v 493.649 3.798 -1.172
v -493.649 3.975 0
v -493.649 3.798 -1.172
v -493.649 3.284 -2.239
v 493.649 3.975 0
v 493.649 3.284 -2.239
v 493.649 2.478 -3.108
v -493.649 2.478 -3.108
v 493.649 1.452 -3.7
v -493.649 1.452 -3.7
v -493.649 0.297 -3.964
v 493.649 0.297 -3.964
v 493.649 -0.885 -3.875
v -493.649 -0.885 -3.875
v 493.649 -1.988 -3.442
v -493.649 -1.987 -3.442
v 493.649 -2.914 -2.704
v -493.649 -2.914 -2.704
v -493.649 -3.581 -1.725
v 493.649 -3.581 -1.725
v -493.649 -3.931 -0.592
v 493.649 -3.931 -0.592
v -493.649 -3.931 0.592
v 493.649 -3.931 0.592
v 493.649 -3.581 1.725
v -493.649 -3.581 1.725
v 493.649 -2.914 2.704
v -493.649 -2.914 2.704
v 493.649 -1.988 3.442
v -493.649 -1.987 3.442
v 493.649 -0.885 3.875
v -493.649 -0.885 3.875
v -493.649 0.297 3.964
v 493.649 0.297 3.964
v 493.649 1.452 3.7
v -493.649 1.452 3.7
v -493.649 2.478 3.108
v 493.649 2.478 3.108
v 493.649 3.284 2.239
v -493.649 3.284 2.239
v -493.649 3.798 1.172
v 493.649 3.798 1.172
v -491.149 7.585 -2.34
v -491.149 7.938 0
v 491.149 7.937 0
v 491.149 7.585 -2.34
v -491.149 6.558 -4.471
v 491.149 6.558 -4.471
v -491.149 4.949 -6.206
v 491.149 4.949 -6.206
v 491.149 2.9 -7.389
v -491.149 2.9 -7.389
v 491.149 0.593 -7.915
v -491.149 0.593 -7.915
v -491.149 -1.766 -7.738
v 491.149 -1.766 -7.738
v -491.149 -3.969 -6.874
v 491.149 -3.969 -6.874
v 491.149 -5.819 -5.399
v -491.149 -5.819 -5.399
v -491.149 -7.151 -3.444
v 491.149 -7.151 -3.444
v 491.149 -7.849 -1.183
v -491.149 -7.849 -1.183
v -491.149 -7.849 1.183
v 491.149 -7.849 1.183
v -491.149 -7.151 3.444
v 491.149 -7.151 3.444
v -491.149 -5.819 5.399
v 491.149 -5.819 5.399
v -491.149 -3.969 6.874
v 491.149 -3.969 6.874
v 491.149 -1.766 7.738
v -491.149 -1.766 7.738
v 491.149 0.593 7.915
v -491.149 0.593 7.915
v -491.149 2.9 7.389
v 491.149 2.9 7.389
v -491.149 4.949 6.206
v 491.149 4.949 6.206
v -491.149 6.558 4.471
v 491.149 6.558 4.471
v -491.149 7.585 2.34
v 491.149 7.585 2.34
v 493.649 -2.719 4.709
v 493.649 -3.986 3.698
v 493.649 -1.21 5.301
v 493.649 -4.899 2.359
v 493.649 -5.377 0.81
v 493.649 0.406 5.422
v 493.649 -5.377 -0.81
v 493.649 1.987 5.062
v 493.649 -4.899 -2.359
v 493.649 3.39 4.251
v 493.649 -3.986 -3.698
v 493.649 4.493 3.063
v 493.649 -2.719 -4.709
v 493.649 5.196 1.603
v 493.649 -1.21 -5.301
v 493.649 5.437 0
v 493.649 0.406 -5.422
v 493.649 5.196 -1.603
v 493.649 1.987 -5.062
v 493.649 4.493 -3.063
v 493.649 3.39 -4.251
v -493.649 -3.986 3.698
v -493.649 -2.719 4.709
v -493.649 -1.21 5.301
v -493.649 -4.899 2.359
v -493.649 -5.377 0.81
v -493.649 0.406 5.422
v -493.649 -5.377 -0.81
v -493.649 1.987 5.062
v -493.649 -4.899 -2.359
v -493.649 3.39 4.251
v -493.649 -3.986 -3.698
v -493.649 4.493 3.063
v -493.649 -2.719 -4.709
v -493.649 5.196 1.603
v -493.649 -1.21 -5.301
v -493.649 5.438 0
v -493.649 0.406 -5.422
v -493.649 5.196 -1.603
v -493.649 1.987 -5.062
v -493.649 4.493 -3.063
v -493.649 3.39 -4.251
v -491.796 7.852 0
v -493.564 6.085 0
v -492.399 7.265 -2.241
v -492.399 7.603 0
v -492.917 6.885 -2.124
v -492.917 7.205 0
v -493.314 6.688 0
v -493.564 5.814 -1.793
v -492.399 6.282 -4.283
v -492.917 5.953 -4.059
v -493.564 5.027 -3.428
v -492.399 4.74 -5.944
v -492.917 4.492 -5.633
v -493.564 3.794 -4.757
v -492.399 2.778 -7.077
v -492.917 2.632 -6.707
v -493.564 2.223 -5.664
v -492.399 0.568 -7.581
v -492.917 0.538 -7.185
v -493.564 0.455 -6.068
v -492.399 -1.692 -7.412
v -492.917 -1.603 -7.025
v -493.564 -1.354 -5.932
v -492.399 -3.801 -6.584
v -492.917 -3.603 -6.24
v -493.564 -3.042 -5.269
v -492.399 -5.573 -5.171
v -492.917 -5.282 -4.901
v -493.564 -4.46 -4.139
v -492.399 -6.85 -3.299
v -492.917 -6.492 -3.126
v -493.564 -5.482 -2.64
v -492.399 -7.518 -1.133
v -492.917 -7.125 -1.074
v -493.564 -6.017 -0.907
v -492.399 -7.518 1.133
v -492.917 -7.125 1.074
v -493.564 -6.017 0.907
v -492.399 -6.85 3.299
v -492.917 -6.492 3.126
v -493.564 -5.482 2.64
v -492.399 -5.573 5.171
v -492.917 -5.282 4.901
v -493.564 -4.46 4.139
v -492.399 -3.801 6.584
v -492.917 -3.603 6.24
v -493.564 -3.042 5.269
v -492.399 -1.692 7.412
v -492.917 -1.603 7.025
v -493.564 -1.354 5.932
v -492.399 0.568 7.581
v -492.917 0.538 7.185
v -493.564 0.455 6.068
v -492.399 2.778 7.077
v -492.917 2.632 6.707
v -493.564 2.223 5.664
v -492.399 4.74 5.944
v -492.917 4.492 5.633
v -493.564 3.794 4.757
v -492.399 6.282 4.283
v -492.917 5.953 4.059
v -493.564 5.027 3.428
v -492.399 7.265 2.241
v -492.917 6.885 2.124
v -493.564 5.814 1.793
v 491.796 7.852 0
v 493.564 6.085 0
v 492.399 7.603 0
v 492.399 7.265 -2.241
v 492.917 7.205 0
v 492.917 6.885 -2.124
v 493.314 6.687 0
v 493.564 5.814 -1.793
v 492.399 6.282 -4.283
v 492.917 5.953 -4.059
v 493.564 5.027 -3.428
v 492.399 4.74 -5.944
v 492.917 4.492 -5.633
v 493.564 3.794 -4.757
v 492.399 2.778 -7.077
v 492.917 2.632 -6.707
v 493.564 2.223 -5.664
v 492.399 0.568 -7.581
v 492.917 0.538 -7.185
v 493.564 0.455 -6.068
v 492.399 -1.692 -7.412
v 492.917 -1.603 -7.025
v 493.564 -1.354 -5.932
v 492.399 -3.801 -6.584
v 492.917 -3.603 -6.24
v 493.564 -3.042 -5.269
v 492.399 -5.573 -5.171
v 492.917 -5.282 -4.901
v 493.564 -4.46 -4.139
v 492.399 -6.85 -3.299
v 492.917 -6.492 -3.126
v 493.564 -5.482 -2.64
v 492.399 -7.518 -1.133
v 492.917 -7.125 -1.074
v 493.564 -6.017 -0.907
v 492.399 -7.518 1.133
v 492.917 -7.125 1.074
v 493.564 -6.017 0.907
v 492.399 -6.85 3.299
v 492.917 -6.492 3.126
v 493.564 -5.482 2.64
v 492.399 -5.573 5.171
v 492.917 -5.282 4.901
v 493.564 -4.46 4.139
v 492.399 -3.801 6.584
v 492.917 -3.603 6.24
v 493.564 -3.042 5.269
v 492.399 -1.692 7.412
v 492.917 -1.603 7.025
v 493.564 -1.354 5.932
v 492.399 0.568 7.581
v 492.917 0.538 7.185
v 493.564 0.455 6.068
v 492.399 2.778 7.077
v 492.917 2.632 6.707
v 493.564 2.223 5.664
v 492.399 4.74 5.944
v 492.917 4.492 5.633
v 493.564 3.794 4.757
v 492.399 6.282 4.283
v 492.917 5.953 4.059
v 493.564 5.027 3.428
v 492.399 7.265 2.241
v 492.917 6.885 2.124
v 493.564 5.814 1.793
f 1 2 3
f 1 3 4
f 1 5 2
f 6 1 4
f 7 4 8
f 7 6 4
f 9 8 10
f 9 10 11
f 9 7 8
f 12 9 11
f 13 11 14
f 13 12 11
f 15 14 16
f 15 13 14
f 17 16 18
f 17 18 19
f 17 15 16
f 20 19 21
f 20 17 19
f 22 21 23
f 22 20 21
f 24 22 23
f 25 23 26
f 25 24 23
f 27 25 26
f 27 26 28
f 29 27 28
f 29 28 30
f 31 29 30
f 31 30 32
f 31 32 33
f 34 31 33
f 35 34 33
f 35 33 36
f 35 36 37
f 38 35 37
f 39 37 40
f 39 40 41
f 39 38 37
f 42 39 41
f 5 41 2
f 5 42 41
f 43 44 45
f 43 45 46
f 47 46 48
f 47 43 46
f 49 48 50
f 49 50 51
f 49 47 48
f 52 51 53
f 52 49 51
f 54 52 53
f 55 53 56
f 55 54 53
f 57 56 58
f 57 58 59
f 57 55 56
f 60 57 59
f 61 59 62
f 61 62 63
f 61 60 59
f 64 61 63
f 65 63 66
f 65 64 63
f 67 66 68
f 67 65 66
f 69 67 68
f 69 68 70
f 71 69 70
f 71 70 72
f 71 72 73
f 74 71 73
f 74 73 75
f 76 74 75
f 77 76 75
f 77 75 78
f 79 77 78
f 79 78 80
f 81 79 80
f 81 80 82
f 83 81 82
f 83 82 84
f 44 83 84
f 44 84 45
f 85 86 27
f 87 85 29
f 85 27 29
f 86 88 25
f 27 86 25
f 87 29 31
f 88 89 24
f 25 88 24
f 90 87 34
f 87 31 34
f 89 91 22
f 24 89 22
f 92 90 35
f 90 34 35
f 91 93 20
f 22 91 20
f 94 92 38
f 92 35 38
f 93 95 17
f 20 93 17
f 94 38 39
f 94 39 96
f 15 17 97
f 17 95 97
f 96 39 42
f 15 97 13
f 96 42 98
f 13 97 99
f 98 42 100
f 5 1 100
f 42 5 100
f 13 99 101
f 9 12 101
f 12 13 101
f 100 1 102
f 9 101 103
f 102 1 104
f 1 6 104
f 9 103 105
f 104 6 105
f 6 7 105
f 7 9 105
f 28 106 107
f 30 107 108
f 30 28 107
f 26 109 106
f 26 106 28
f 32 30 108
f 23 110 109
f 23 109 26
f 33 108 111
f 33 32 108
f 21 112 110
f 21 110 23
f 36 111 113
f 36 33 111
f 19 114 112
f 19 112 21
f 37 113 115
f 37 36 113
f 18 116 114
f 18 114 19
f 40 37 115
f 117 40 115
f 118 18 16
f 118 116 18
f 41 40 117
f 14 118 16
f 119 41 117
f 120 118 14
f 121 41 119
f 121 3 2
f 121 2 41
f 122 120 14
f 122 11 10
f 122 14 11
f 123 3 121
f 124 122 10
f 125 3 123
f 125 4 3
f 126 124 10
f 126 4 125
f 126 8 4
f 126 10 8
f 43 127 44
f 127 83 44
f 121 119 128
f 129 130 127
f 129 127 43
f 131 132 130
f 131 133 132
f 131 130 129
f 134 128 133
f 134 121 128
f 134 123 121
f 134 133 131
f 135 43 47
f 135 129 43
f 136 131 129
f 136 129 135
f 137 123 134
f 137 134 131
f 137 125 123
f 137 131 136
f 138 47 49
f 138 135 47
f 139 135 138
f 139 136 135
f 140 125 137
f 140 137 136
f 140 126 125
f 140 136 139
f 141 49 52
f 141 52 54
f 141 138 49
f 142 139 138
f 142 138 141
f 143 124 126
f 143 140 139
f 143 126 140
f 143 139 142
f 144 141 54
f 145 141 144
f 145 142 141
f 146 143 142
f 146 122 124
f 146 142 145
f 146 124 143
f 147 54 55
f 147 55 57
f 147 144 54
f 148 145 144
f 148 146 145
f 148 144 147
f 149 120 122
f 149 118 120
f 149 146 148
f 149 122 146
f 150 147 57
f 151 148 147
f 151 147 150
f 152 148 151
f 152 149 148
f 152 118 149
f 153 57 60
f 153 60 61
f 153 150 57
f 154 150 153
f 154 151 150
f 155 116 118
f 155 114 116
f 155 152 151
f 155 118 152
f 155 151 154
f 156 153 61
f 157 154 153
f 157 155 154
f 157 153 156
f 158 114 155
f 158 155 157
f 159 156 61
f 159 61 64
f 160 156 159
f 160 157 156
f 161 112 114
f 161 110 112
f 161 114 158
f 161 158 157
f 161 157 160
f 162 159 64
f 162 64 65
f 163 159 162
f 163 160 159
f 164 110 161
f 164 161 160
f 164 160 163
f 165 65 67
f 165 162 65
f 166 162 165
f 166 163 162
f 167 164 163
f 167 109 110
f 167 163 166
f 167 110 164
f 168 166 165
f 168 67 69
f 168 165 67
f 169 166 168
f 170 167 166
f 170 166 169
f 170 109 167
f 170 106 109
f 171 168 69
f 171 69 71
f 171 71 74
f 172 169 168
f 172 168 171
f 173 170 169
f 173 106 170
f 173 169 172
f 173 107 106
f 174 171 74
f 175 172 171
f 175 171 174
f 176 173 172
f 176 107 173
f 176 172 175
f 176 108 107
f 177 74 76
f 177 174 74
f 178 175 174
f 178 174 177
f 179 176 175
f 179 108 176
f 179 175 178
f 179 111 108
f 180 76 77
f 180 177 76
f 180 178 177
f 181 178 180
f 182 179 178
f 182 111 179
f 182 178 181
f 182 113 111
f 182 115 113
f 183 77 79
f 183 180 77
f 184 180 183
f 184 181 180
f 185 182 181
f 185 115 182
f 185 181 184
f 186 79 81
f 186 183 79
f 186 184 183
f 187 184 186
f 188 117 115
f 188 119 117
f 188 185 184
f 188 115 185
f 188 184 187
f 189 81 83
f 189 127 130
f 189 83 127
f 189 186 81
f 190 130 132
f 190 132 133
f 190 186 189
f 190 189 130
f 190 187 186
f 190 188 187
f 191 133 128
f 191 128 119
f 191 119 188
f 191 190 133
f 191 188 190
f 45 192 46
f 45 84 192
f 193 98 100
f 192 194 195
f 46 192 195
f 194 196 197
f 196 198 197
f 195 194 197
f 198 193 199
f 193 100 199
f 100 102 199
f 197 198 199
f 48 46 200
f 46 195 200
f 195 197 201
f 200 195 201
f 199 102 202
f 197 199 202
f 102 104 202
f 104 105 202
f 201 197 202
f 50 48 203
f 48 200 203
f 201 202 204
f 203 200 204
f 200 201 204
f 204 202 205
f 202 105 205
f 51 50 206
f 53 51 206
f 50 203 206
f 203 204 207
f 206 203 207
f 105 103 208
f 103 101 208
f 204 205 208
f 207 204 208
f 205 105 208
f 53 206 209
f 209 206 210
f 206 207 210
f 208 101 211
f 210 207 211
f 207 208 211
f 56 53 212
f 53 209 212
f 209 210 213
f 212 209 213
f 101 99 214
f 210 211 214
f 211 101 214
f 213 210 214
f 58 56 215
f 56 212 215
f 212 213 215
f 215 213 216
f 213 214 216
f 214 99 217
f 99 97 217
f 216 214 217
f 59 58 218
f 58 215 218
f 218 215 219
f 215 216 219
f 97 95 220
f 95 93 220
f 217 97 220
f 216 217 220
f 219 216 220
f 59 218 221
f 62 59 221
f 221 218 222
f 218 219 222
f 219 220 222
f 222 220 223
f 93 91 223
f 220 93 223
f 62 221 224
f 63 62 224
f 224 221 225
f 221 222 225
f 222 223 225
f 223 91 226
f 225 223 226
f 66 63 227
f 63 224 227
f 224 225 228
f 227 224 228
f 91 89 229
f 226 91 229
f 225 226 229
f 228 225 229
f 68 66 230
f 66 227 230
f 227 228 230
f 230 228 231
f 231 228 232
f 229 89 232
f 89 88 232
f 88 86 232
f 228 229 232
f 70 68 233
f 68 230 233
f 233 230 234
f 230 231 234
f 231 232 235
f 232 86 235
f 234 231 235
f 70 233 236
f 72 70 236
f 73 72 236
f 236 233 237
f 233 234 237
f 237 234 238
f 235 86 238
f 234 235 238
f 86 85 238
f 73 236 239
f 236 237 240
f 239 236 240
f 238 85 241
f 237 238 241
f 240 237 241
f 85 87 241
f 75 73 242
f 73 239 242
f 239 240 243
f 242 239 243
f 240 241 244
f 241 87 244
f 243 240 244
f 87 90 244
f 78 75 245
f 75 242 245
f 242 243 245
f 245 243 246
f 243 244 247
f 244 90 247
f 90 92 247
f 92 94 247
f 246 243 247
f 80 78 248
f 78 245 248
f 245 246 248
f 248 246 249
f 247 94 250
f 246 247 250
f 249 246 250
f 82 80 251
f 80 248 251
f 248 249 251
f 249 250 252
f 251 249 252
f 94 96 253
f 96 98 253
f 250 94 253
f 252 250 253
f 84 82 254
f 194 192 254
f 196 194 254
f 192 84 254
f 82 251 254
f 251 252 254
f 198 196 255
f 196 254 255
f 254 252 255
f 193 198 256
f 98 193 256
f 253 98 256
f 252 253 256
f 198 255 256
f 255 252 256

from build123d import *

# Parameters (mm, degrees)
SKETCH_1_R        = 7.9375
SKETCH_1_R_2      = 3.975
EXTRUDE_1_DEPTH   = 493.649
FILLET_1_R        = 2.5
MOVE_BODY_1_ANGLE = 90


with BuildPart() as part:
    # 스케치1 → 보스-돌출1 (new body, symmetric)
    with BuildSketch(Plane(origin=(0, 0, 0), x_dir=(1, 0, 0), z_dir=(0, 1, 0))):
        Circle(SKETCH_1_R)
        Circle(SKETCH_1_R_2, mode=Mode.SUBTRACT)
    extrude(amount=EXTRUDE_1_DEPTH, both=True)

    # 필렛1
    fillet_1_edges = [part.edges().sort_by_distance(p)[0] for p in [
        (-7.9375, -493.649, 0),
        (-7.9375, 493.649, 0),
    ]]
    fillet(fillet_1_edges, radius=FILLET_1_R)


with BuildPart() as part_1:
    # Move Body 1: moved
    add(part.part.rotate(Axis((0, 0, 0), (0, 0, 1)), MOVE_BODY_1_ANGLE))


solid = part_1.part
